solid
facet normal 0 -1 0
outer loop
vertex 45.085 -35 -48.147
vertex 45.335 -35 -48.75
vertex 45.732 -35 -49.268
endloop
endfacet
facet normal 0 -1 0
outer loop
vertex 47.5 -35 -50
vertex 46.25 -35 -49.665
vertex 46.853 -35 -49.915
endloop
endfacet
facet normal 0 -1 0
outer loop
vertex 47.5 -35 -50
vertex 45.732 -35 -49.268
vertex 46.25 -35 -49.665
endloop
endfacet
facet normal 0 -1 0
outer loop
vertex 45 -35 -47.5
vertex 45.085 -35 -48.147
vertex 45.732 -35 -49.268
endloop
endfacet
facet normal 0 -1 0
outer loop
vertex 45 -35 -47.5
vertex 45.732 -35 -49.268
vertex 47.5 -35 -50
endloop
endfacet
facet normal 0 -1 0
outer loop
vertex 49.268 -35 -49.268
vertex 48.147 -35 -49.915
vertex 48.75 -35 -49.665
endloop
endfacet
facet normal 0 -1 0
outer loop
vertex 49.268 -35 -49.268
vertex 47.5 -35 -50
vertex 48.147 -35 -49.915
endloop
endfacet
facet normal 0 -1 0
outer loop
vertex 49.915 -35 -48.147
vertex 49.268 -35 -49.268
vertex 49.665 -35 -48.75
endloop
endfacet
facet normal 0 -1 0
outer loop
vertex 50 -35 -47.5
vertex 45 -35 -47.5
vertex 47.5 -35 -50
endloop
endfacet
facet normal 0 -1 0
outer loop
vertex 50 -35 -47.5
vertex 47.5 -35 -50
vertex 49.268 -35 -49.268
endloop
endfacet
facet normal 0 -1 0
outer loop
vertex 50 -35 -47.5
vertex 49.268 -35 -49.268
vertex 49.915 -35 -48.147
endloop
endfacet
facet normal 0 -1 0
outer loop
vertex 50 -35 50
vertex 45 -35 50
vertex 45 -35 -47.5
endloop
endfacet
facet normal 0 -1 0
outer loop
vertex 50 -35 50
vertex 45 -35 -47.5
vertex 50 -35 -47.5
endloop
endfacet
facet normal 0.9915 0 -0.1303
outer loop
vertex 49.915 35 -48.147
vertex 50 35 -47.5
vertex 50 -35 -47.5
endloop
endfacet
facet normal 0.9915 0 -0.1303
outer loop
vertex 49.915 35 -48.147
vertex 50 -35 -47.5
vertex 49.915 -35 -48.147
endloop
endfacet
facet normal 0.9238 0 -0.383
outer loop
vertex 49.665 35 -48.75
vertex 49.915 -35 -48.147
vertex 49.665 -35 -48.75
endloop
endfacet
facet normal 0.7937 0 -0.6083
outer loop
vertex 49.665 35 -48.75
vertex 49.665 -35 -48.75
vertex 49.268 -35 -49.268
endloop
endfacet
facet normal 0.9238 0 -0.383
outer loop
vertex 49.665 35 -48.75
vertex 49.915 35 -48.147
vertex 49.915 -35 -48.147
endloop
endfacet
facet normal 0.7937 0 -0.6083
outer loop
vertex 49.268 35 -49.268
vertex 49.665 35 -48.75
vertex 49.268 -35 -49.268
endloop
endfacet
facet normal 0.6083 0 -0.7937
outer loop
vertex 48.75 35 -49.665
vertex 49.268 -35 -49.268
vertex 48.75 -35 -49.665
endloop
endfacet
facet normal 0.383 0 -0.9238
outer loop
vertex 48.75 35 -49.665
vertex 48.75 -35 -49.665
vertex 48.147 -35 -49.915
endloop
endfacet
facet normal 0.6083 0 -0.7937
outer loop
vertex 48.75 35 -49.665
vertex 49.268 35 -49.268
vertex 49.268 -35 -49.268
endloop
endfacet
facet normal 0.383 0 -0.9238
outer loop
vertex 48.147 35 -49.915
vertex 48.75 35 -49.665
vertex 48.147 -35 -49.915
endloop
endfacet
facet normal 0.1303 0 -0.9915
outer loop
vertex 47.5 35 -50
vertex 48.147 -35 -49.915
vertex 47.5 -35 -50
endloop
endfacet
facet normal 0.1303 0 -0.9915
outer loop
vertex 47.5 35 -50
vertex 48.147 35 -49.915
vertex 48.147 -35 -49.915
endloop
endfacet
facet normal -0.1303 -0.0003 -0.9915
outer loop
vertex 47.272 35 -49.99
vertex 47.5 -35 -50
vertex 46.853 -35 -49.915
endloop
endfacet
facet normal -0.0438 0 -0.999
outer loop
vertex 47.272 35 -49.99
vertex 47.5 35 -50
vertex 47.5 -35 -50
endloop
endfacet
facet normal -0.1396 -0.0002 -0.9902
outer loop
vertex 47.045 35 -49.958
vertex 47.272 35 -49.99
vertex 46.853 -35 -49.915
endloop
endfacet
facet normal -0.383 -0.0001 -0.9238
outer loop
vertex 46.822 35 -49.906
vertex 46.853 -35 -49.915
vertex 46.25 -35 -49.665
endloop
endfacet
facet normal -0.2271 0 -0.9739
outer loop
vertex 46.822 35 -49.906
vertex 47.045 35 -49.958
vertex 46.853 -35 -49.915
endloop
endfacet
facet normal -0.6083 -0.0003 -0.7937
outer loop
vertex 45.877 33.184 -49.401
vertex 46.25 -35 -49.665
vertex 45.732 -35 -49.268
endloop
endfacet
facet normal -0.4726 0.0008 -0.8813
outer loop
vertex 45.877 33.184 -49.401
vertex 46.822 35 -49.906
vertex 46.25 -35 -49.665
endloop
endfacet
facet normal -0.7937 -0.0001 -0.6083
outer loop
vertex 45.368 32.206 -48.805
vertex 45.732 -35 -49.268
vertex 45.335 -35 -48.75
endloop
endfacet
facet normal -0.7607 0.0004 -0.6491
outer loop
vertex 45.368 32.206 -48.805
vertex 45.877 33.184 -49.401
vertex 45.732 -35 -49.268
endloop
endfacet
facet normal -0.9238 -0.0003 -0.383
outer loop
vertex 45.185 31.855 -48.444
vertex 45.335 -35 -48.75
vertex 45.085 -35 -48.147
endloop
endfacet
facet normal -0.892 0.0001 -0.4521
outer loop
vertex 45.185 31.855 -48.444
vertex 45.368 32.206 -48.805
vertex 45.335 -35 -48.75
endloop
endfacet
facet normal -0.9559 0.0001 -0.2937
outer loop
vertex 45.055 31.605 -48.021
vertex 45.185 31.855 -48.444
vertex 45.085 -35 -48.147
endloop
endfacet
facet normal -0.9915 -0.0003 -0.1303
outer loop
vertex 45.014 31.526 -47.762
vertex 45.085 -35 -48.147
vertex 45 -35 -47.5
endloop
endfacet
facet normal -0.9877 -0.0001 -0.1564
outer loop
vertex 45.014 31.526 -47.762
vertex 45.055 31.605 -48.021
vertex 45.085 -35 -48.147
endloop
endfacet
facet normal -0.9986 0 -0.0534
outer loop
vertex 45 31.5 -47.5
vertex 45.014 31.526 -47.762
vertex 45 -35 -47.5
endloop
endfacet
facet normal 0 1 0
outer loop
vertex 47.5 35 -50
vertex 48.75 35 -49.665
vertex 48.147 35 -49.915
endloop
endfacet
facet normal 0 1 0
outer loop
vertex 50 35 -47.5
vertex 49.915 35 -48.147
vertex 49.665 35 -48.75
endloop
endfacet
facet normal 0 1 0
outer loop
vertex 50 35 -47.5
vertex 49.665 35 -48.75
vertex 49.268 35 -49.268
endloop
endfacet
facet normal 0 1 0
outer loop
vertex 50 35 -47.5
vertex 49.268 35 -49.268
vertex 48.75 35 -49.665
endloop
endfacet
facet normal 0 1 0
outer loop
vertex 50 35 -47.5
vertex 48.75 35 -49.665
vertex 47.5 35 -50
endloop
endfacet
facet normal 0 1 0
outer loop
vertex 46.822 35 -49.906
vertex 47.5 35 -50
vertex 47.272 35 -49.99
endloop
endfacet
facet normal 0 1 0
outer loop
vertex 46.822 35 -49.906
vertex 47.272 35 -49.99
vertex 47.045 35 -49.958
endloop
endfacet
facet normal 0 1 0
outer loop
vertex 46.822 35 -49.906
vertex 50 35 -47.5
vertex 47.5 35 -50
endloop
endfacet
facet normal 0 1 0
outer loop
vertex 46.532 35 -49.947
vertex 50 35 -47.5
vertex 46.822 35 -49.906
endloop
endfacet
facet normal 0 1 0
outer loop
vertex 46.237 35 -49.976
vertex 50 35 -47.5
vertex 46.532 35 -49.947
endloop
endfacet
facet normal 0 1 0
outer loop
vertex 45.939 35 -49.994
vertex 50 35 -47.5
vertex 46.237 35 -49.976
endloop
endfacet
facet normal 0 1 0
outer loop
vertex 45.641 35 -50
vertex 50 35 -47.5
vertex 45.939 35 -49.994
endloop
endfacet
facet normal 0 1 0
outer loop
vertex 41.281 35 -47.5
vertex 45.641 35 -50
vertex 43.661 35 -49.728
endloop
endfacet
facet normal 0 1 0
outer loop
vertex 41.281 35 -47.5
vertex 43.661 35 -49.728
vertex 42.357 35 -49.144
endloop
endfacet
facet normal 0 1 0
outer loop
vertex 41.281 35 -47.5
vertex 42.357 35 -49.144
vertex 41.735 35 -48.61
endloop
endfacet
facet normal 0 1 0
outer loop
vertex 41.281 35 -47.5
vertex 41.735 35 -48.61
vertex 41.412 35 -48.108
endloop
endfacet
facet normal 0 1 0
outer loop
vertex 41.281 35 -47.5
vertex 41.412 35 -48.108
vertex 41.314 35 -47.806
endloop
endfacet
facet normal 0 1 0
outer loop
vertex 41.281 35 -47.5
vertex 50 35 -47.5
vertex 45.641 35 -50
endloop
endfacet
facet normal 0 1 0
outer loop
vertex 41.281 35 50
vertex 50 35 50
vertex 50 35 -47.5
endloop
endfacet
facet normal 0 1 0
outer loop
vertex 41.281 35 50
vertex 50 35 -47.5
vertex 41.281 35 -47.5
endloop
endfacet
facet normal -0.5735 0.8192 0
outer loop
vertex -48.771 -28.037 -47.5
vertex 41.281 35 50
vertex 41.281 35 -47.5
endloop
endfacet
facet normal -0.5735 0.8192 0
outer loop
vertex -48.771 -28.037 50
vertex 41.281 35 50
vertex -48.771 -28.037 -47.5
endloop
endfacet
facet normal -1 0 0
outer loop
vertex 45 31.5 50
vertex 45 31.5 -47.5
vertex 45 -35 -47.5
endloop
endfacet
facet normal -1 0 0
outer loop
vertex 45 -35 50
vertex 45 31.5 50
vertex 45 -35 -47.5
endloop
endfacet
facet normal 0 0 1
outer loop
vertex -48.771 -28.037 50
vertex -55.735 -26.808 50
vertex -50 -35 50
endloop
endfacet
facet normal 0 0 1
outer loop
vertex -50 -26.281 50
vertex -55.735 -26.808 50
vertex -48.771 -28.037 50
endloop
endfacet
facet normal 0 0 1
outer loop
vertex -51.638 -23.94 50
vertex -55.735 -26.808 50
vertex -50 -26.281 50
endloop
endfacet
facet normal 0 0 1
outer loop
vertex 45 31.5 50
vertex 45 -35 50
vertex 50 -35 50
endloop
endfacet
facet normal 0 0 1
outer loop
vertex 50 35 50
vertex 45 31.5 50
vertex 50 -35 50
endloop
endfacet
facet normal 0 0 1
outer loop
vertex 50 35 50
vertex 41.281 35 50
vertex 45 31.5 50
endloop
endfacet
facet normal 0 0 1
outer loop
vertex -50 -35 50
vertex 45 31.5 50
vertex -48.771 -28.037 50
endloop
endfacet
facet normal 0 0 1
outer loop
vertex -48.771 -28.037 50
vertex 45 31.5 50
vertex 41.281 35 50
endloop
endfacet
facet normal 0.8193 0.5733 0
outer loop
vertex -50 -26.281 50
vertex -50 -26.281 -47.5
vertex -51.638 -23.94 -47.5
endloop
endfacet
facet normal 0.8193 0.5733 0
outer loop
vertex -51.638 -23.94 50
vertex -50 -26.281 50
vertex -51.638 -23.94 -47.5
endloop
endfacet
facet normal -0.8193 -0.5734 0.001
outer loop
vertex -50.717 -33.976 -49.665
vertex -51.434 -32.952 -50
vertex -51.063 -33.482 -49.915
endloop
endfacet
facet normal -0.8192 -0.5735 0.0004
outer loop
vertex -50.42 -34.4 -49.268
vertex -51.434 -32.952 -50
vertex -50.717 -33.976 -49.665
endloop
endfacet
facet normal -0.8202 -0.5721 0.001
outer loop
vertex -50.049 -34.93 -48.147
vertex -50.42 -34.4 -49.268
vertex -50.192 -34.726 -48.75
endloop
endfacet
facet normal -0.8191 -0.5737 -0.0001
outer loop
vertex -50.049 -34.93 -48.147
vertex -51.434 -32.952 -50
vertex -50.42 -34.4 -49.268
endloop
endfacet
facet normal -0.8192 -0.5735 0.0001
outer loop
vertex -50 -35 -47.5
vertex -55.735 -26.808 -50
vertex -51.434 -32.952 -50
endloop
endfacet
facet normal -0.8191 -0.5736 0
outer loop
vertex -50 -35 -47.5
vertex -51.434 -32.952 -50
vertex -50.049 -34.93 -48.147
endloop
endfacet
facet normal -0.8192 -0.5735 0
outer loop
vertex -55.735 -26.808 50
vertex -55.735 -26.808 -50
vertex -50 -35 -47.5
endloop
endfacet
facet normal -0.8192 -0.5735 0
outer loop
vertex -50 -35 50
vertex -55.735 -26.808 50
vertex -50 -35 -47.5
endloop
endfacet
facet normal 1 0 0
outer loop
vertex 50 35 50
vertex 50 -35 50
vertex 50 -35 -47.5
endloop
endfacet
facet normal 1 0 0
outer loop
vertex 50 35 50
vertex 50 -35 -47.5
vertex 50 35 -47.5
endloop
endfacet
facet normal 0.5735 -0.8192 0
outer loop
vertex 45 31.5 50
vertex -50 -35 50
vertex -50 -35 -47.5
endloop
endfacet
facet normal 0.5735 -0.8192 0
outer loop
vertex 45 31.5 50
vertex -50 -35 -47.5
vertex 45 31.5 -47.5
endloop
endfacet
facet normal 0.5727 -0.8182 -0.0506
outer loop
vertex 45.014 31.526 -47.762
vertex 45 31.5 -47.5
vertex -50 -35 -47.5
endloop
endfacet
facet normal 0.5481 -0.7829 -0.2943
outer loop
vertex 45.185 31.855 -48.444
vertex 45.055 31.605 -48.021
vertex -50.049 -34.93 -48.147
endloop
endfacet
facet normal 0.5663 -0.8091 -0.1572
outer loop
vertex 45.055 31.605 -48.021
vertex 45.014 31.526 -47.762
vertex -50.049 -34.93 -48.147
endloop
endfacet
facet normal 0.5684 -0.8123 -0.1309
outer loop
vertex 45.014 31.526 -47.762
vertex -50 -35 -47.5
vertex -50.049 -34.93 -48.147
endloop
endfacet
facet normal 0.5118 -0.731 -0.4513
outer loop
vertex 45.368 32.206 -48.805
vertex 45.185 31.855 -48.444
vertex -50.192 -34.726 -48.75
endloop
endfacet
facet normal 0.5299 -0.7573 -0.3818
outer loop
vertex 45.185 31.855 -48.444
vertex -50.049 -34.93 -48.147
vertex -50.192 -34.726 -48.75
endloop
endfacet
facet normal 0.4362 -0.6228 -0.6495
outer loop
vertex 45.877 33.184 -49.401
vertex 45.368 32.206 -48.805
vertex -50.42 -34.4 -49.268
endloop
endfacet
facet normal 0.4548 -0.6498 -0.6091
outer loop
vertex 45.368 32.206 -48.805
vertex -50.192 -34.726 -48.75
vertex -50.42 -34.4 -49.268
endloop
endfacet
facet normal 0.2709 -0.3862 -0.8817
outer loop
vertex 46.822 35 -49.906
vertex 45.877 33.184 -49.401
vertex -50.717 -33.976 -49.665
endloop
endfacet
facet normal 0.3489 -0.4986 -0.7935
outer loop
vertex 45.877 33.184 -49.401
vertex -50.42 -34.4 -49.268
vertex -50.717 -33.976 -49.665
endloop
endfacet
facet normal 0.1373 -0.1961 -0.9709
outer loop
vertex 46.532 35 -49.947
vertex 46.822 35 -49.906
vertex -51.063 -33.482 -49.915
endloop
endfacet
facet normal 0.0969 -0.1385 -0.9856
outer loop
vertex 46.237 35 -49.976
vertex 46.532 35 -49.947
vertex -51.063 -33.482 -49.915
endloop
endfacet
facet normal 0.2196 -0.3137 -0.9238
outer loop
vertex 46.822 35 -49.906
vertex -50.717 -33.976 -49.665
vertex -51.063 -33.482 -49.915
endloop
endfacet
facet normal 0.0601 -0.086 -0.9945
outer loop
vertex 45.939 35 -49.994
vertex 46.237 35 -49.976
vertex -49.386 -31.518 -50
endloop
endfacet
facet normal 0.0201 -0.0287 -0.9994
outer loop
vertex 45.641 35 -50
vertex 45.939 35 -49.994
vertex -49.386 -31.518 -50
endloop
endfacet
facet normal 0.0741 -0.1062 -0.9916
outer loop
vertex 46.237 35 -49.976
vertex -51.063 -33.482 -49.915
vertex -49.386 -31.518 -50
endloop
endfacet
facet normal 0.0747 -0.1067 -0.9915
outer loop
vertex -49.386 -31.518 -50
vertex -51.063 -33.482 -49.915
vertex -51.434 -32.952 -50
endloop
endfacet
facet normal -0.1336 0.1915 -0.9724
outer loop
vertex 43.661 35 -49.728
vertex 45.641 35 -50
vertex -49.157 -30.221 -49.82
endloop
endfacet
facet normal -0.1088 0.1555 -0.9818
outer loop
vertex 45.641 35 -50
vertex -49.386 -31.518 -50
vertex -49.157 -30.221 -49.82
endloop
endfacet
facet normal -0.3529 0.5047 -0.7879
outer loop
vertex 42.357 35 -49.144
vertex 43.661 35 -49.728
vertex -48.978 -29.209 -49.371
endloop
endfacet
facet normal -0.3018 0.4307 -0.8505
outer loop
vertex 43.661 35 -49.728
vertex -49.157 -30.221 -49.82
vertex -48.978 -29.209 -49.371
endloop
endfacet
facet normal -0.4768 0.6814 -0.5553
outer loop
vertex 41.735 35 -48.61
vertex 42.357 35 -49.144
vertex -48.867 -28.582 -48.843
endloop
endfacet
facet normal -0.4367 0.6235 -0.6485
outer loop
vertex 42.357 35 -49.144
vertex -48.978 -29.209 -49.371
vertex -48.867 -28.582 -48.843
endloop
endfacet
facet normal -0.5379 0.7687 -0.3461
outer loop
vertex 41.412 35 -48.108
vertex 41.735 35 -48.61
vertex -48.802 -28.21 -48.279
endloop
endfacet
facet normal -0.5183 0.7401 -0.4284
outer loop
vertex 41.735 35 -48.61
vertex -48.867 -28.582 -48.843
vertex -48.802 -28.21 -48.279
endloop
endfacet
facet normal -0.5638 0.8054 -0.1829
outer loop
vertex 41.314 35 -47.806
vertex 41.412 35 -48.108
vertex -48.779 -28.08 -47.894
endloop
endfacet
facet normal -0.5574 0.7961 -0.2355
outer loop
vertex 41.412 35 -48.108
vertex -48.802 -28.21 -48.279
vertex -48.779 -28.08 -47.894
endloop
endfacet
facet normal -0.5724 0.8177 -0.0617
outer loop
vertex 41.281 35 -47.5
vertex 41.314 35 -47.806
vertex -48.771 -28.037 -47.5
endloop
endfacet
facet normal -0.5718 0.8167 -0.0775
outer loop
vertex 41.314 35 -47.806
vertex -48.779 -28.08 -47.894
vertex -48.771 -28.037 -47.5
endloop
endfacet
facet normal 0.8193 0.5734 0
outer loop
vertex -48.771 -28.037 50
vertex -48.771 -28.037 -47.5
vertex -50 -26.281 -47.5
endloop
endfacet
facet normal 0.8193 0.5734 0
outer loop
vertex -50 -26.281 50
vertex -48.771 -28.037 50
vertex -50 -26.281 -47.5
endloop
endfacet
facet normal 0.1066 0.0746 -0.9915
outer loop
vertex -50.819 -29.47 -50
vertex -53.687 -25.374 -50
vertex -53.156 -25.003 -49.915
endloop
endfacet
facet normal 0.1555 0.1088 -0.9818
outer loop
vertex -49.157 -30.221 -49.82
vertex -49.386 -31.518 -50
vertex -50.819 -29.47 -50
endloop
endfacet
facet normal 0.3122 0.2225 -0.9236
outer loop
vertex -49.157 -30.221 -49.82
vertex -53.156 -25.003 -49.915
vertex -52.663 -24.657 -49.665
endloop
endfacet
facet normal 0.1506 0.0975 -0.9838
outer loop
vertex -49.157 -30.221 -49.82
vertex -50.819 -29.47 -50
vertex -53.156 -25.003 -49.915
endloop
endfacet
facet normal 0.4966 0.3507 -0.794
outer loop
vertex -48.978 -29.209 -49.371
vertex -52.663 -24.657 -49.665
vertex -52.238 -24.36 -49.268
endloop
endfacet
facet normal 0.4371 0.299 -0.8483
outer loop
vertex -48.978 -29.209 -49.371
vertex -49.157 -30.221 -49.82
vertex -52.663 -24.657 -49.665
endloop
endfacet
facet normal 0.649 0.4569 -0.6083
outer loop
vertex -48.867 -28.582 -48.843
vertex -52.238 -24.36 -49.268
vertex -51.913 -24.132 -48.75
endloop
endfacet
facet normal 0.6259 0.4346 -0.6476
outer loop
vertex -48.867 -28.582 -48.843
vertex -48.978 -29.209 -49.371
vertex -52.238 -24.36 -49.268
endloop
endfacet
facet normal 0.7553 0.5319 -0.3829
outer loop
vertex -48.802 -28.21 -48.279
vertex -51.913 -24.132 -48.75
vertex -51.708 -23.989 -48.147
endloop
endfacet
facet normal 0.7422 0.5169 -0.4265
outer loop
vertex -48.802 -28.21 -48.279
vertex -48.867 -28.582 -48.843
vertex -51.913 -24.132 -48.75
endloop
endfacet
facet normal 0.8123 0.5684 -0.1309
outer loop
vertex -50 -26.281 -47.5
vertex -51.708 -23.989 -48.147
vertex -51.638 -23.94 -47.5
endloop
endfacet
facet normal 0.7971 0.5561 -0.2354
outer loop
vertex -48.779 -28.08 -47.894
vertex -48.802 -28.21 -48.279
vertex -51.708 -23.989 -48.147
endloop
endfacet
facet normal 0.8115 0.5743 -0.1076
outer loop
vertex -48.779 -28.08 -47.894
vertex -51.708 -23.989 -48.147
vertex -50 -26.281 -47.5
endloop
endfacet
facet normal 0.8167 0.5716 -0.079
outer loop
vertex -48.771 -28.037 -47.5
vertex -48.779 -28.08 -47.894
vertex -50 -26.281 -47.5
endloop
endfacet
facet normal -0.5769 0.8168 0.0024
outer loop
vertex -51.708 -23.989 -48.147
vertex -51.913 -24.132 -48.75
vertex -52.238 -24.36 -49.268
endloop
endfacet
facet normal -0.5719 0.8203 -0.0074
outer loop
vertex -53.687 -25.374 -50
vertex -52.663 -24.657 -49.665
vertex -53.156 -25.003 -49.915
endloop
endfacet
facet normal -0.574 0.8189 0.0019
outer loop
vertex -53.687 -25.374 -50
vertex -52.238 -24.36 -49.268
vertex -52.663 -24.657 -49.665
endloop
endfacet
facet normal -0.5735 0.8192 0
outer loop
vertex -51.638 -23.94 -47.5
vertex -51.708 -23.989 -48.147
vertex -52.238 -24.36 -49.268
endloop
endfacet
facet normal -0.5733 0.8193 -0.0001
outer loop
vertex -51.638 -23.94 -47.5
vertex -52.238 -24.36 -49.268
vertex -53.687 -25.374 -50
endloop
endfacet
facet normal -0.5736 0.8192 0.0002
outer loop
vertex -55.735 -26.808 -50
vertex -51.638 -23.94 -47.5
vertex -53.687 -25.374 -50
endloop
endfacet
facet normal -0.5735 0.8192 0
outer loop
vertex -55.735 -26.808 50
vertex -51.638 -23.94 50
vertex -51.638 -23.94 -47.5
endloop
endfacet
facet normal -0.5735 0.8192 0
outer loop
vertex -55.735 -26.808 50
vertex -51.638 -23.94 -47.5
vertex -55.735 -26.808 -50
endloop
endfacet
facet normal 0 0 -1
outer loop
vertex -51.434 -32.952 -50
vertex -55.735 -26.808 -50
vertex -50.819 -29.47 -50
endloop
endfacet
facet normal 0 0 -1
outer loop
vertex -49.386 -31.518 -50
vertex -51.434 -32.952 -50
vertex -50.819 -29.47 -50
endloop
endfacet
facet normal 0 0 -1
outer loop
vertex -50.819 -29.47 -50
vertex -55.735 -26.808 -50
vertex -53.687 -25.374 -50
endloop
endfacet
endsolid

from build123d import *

# Parameters (mm, degrees)
F1_DEPTH      = 50
F1_DEPTH_BACK = 50
F2_T1_DEPTH   = 82.5
F2_T3_DEPTH   = 116.1726990145
F2_T5_DEPTH   = 11.25
F2_T10_DEPTH  = 79
F2_T15_DEPTH  = 128.4622783495
F2_T21_DEPTH  = 128.4622783495
F2_T25_DEPTH  = 79
F2_T32_DEPTH  = 122.4226990145
F2_T36_DEPTH  = 17.5


# Not quite as in the source:
# - a fillet or chamfer that OpenCascade refuses, or shapes differently, is made with other operations: its cross-section is extruded or revolved along the edge and cut away or added


with BuildPart() as f1:
    # F0 (on Top) → F1 (new body, two sides)
    with BuildSketch(Plane.XY) as f1_sk:
        Polygon((50, 35), (41.281031703, 35), (-48.7711521192, -28.0365286756), (-50, -26.281031703), (-51.638463841, -23.940369073), (-55.7346234436, -26.8076807948), (-52.8673117218, -30.9038403974), (-50, -35), (45, 31.5), (45, -35), (50, -35), align=None)
    extrude(amount=F1_DEPTH)
    extrude(f1_sk.sketch, amount=-F1_DEPTH_BACK)

    # F2: fillet of radius 2.5 on 5 edges, made by hand

    # F2_s2 → F2_t1 (cut)
    with BuildSketch(Plane.XZ.offset(-41.25)):
        with BuildLine():
            ThreePointArc((47.5, -50), (49.267766953, -49.267766953), (50, -47.5))
            Line((50, -47.5), (50, -50))
            Line((50, -50), (47.5, -50))
        make_face()
    extrude(amount=F2_T1_DEPTH, mode=Mode.SUBTRACT)

    # F2_s4 → F2_t3 (cut)
    with BuildSketch(Plane(origin=(49.2685429281, 34.4879800497, 0), x_dir=(0, 0, 1), z_dir=(-0.8192319205, -0.5734623444, 0))):
        with BuildLine():
            ThreePointArc((-50, 2.5), (-49.267766953, 4.267766953), (-47.5, 5))
            Line((-47.5, 5), (-50, 5))
            Line((-50, 5), (-50, 2.5))
        make_face()
    extrude(amount=F2_T3_DEPTH, mode=Mode.SUBTRACT)

    # F2_s6 → F2_t5 (cut)
    with BuildSketch(Plane(origin=(-2.8673117218, 4.0961596026, 0), x_dir=(0, 0, 1), z_dir=(-0.5734623444, 0.8192319205, 0))):
        with BuildLine():
            ThreePointArc((-50, -58.5327780787), (-49.267766953, -56.7650111257), (-47.5, -56.0327780787))
            Line((-47.5, -56.0327780787), (-50, -56.0327780787))
            Line((-50, -56.0327780787), (-50, -58.5327780787))
        make_face()
    extrude(amount=F2_T5_DEPTH, mode=Mode.SUBTRACT)


with BuildPart() as f2_tool8:
    # F2_s9 → F2_t10 (new body)
    with BuildSketch(Plane.XZ.offset(-37.75)):
        with BuildLine():
            ThreePointArc((47.5, -50), (45.732233047, -49.267766953), (45, -47.5))
            Line((45, -47.5), (45, -50))
            Line((45, -50), (47.5, -50))
        make_face()
    extrude(amount=F2_T10_DEPTH)

    split(bisect_by=Plane(origin=(0, 0, 0), x_dir=(0, 0, 1), z_dir=(0.5734623444, -0.8192319205, 0)), keep=Keep.TOP)


with BuildPart() as f1_1:
    add(f1.part)

    # F2_t7: cut F2_tool8
    add(f2_tool8.part, mode=Mode.SUBTRACT)


with BuildPart() as f2_tool13:
    # F2_s14 → F2_t15 (new body)
    with BuildSketch(Plane(origin=(-55.1201995032, -38.5841396523, 0), x_dir=(0, 0, 1), z_dir=(0.8192319205, 0.5734623444, 0))):
        with BuildLine():
            ThreePointArc((-47.5, 0), (-49.267766953, -0.732233047), (-50, -2.5))
            Line((-50, -2.5), (-50, 0))
            Line((-50, 0), (-47.5, 0))
        make_face()
    extrude(amount=F2_T15_DEPTH)

    split(bisect_by=Plane.YZ.offset(45), keep=Keep.BOTTOM)


with BuildPart() as f1_2:
    add(f1_1.part)

    # F2_t12: cut F2_tool13
    add(f2_tool13.part, mode=Mode.SUBTRACT)


with BuildPart() as f2_tool19:
    # F2_s20 → F2_t21 (new body)
    with BuildSketch(Plane(origin=(-55.1201995032, -38.5841396523, 0), x_dir=(0, 0, 1), z_dir=(0.8192319205, 0.5734623444, 0))):
        with BuildLine():
            ThreePointArc((-47.5, 0), (-49.267766953, -0.732233047), (-50, -2.5))
            Line((-50, -2.5), (-50, 0))
            Line((-50, 0), (-47.5, 0))
        make_face()
    extrude(amount=F2_T21_DEPTH)

    split(bisect_by=Plane.YZ.offset(45), keep=Keep.TOP)


with BuildPart() as f2_tool23:
    # F2_s24 → F2_t25 (new body)
    with BuildSketch(Plane.XZ.offset(-37.75)):
        with BuildLine():
            ThreePointArc((47.5, -50), (45.732233047, -49.267766953), (45, -47.5))
            Line((45, -47.5), (45, -50))
            Line((45, -50), (47.5, -50))
        make_face()
    extrude(amount=F2_T25_DEPTH)

    split(bisect_by=Plane(origin=(0, 0, 0), x_dir=(0, 0, 1), z_dir=(-0.5734623444, 0.8192319205, 0)), keep=Keep.TOP)


with BuildPart() as f2_tool19_1:
    add(f2_tool19.part)

    # F2_t27: intersect F2_tool23
    add(f2_tool23.part, mode=Mode.INTERSECT)


with BuildPart() as f1_3:
    add(f1_2.part)

    # F2_t17: cut F2_tool19
    add(f2_tool19_1.part, mode=Mode.SUBTRACT)


with BuildPart() as f2_tool30:
    # F2_s31 → F2_t32 (new body)
    with BuildSketch(Plane(origin=(49.2685429281, 34.4879800497, 0), x_dir=(0, 0, 1), z_dir=(-0.8192319205, -0.5734623444, 0))):
        with BuildLine():
            ThreePointArc((-50, 2.5), (-49.267766953, 4.267766953), (-47.5, 5))
            Line((-47.5, 5), (-50, 5))
            Line((-50, 5), (-50, 2.5))
        make_face()
    extrude(amount=F2_T32_DEPTH)

    split(bisect_by=Plane(origin=(-45.9038403974, -32.1326882782, 0), x_dir=(0, 0, 1), z_dir=(-0.8192319205, -0.5734623444, 0)), keep=Keep.TOP)


with BuildPart() as f2_tool34:
    # F2_s35 → F2_t36 (new body)
    with BuildSketch(Plane(origin=(0.7168279305, -1.0240399006, 0), x_dir=(0, 0, 1), z_dir=(-0.5734623444, 0.8192319205, 0))):
        with BuildLine():
            ThreePointArc((-50, -58.5327780787), (-49.267766953, -56.7650111257), (-47.5, -56.0327780787))
            Line((-47.5, -56.0327780787), (-50, -56.0327780787))
            Line((-50, -56.0327780787), (-50, -58.5327780787))
        make_face()
    extrude(amount=F2_T36_DEPTH)

    split(bisect_by=Plane(origin=(-2.8673117218, 4.0961596026, 0), x_dir=(0, 0, 1), z_dir=(0.5734623444, -0.8192319205, 0)), keep=Keep.TOP)


with BuildPart() as f2_tool30_1:
    add(f2_tool30.part)

    # F2_t38: intersect F2_tool34
    add(f2_tool34.part, mode=Mode.INTERSECT)


with BuildPart() as f1_4:
    add(f1_3.part)

    # F2_t28: cut F2_tool30
    add(f2_tool30_1.part, mode=Mode.SUBTRACT)


solid = f1_4.part
